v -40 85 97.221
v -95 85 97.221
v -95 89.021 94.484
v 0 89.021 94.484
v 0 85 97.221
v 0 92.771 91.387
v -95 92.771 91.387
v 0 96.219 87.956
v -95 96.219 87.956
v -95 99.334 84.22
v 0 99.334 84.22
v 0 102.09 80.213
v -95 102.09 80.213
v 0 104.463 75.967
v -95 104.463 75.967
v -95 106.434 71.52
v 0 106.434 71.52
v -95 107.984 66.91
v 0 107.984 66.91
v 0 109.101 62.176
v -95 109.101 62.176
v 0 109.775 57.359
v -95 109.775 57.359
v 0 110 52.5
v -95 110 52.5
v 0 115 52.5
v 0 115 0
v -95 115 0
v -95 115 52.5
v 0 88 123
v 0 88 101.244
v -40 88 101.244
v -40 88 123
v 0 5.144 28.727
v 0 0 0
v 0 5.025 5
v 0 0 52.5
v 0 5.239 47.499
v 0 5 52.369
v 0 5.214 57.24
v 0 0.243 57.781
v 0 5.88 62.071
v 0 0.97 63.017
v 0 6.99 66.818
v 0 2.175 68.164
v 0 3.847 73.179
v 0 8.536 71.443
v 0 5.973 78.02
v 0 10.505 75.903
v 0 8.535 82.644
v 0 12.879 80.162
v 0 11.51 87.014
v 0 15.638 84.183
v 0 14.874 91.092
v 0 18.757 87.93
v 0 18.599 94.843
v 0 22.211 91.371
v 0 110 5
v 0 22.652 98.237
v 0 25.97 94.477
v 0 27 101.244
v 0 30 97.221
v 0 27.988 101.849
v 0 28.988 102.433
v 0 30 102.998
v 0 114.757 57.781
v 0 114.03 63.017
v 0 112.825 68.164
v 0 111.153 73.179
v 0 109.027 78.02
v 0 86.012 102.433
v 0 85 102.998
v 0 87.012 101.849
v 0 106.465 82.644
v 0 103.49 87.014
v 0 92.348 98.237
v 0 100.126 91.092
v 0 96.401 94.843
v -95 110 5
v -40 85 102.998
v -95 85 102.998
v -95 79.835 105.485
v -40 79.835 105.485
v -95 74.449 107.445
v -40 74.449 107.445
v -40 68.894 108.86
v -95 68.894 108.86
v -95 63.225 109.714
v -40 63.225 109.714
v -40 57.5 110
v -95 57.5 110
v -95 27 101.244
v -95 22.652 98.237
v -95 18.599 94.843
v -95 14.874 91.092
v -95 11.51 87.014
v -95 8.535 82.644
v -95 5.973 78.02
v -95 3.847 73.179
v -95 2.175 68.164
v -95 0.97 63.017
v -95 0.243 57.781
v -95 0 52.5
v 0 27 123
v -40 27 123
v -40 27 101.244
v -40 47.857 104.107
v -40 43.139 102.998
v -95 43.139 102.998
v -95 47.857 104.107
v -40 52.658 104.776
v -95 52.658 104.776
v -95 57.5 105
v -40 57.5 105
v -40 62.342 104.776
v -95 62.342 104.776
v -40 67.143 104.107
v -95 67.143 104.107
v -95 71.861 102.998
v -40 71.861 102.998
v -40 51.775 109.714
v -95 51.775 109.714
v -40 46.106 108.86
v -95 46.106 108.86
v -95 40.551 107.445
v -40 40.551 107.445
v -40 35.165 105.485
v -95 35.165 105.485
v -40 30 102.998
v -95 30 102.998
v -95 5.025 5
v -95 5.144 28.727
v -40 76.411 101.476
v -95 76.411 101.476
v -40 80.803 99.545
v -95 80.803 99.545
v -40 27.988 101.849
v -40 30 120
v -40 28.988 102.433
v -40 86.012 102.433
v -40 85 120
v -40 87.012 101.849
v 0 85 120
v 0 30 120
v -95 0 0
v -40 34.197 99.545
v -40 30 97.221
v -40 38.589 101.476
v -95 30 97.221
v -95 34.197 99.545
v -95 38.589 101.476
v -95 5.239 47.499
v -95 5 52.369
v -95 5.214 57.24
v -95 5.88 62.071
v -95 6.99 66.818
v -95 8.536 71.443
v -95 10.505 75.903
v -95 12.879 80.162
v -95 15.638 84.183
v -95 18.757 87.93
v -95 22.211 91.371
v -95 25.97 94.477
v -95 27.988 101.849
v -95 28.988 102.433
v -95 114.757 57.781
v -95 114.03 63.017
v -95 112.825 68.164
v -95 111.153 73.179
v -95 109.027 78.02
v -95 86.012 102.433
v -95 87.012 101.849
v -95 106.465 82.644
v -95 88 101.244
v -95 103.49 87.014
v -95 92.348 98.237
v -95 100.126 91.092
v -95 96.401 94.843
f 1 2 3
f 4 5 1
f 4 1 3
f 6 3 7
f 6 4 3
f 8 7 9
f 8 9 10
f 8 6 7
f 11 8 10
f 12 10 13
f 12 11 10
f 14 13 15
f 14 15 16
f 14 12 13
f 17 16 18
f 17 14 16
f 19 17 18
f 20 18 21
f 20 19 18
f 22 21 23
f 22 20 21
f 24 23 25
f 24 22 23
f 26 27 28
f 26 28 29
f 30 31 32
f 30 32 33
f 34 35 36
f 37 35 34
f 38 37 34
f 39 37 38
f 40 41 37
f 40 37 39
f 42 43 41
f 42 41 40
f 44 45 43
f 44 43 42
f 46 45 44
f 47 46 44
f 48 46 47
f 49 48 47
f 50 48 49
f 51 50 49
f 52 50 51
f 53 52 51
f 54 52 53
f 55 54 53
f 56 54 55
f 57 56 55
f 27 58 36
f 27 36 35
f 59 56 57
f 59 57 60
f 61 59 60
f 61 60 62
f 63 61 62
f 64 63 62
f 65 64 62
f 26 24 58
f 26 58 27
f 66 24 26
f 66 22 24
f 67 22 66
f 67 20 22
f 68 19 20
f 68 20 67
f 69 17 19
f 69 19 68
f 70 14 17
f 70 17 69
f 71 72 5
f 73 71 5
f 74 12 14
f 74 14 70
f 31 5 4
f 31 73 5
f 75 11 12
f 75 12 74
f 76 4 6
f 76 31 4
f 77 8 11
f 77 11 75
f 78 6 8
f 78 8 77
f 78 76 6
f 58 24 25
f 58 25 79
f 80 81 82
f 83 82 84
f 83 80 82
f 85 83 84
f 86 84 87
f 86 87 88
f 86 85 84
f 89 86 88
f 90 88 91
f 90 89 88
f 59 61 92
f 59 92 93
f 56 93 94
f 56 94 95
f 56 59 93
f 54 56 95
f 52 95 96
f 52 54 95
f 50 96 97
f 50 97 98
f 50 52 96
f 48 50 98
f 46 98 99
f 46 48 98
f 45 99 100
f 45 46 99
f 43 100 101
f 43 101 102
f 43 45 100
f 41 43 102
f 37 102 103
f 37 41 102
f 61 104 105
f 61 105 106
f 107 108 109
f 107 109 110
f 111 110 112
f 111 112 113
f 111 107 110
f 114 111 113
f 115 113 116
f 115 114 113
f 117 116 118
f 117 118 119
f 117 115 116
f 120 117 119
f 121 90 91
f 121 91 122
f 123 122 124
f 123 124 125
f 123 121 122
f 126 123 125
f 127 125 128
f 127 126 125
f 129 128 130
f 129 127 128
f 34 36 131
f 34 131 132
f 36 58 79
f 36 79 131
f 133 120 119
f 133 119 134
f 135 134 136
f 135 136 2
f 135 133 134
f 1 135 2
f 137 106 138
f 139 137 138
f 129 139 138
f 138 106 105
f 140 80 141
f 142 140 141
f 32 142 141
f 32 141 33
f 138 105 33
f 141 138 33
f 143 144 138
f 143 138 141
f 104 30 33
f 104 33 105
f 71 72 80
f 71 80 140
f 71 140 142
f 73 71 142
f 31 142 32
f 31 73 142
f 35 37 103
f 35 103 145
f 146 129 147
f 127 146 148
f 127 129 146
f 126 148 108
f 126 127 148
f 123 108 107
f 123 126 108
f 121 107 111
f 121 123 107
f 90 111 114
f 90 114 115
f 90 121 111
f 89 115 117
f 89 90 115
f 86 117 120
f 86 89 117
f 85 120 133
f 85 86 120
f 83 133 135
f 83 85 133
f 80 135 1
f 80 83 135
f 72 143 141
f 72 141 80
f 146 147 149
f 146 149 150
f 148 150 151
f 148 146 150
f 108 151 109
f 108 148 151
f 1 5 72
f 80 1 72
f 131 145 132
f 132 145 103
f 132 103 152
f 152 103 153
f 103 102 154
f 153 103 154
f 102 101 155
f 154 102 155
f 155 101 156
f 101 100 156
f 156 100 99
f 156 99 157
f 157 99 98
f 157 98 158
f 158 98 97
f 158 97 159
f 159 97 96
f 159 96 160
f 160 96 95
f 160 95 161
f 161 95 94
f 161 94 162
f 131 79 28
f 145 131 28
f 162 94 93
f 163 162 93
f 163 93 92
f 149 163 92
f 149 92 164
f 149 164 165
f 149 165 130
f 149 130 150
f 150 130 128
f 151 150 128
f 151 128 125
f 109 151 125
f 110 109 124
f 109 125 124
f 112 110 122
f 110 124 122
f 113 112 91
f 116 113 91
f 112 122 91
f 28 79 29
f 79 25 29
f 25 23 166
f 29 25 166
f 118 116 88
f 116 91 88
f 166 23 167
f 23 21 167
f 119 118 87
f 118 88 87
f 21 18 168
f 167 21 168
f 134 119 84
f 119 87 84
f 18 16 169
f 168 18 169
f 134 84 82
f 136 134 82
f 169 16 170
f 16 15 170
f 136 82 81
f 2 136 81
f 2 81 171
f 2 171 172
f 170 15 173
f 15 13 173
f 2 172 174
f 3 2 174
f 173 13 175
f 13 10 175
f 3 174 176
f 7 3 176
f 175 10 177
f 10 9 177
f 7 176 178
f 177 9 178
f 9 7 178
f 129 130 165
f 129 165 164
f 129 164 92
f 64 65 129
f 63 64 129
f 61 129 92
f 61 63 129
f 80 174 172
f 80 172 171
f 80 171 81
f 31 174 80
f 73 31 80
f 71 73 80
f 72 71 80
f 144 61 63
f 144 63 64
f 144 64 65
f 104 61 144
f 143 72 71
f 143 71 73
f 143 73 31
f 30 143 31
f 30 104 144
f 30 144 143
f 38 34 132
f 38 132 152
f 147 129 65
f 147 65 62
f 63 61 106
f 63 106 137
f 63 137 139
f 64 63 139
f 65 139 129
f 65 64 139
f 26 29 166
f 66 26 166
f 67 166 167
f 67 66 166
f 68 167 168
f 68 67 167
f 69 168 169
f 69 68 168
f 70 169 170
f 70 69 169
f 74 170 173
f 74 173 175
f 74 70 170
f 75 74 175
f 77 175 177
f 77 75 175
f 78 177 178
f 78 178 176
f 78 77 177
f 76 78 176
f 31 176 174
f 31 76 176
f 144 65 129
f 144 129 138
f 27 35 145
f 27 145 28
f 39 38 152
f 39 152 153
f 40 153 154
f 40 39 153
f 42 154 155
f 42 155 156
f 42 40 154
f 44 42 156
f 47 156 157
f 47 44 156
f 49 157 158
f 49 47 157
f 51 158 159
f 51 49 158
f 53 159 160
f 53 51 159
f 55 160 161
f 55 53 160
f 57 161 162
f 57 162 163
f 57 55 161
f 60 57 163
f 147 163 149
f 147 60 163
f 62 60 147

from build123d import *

# Parameters (mm, degrees)
F0_W     = 5
F0_H     = 5
F1_DEPTH = 95
F2_DEPTH = 40
F3_DEPTH = 40


with BuildPart() as f1:
    # F0 (on Right) → F1 (new body)
    with BuildSketch(Plane.YZ):
        with BuildLine():
            ThreePointArc((25.096296508, 5), (29.4604368108, 2.3000707554), (34.0479212009, 0))
            Line((34.0479212009, 0), (57.5, 0))
            ThreePointArc((57.5, 0), (46.0435607626, 1.2652461702), (35.139320225, 5))
            Line((35.139320225, 5), (25.096296508, 5))
        make_face()
        with Locations((112.5, 2.5)):
            Rectangle(F0_W, F0_H)
        with BuildLine():
            Line((5.0251261048, 5), (5, 0))
            Line((5, 0), (34.0479212009, 0))
            ThreePointArc((34.0479212009, 0), (29.4604368108, 2.3000707554), (25.096296508, 5))
            Line((25.096296508, 5), (5.0251261048, 5))
        make_face()
        with BuildLine():
            ThreePointArc((79.860679775, 5), (68.9564392374, 1.2652461702), (57.5, 0))
            Line((57.5, 0), (80.9520787991, 0))
            ThreePointArc((80.9520787991, 0), (85.5395631892, 2.3000707554), (89.903703492, 5))
            Line((89.903703492, 5), (79.860679775, 5))
        make_face()
        with BuildLine():
            ThreePointArc((89.903703492, 5), (85.5395631892, 2.3000707554), (80.9520787991, 0))
            Line((80.9520787991, 0), (110, 0))
            Line((110, 0), (110, 5))
            Line((110, 5), (89.903703492, 5))
        make_face()
        with BuildLine():
            Line((110, 29.0479212009), (110, 5))
            Line((110, 5), (115, 5))
            Line((115, 5), (115, 52.5))
            ThreePointArc((115, 52.5), (113.736109396, 40.5104211917), (110, 29.0479212009))
        make_face()
        with BuildLine():
            Line((0, 52.5), (0, 5))
            Line((0, 5), (5.0251261048, 5))
            Line((5.0251261048, 5), (5.1443614689, 28.7273873123))
            ThreePointArc((5.1443614689, 28.7273873123), (1.3008042071, 40.3385694826), (0, 52.5))
        make_face()
        Polygon((0, 5), (0, 0), (5, 0), (5.0251261048, 5), align=None)
        with BuildLine():
            ThreePointArc((35.139320225, 5), (46.0435607626, 1.2652461702), (57.5, 0))
            ThreePointArc((57.5, 0), (68.9564392374, 1.2652461702), (79.860679775, 5))
            Line((79.860679775, 5), (35.139320225, 5))
        make_face()
        with BuildLine():
            ThreePointArc((27, 101.2442304278), (7.2008946402, 80.3612634315), (0, 52.5))
            ThreePointArc((0, 52.5), (1.3008042071, 40.3385694826), (5.1443614689, 28.7273873123))
            Line((5.1443614689, 28.7273873123), (5.2386949818, 47.4994002563))
            ThreePointArc((5.2386949818, 47.4994002563), (10.5049496909, 75.9033169967), (30, 97.22135955))
            Line((30, 97.22135955), (30, 102.9975246918))
            ThreePointArc((30, 102.9975246918), (28.4867528499, 102.1435442913), (27, 101.2442304278))
        make_face()
        with BuildLine():
            ThreePointArc((85, 97.22135955), (103.3257569496, 78.1173769149), (110, 52.5))
            Line((110, 52.5), (110, 29.0479212009))
            ThreePointArc((110, 29.0479212009), (113.736109396, 40.5104211917), (115, 52.5))
            ThreePointArc((115, 52.5), (107.7991053598, 80.3612634315), (88, 101.2442304278))
            ThreePointArc((88, 101.2442304278), (86.5132471501, 102.1435442913), (85, 102.9975246918))
            Line((85, 102.9975246918), (85, 97.22135955))
        make_face()
        with BuildLine():
            ThreePointArc((57.5, 110), (43.311231022, 108.2218882926), (30, 102.9975246918))
            Line((30, 102.9975246918), (43.1385933837, 102.9975246918))
            ThreePointArc((43.1385933837, 102.9975246918), (57.5, 105), (71.8614066163, 102.9975246918))
            Line((71.8614066163, 102.9975246918), (85, 102.9975246918))
            ThreePointArc((85, 102.9975246918), (71.688768978, 108.2218882926), (57.5, 110))
        make_face()
        with BuildLine():
            Line((43.1385933837, 102.9975246918), (30, 102.9975246918))
            Line((30, 102.9975246918), (30, 97.22135955))
            ThreePointArc((30, 97.22135955), (36.3709829403, 100.5605309801), (43.1385933837, 102.9975246918))
        make_face()
        with BuildLine():
            ThreePointArc((71.8614066163, 102.9975246918), (78.6290170597, 100.5605309801), (85, 97.22135955))
            Line((85, 97.22135955), (85, 102.9975246918))
            Line((85, 102.9975246918), (71.8614066163, 102.9975246918))
        make_face()
    extrude(amount=-F1_DEPTH)

    # F0 (on Right) → F3 (cut)
    with BuildSketch(Plane.YZ):
        with BuildLine():
            ThreePointArc((57.5, 110), (43.311231022, 108.2218882926), (30, 102.9975246918))
            Line((30, 102.9975246918), (43.1385933837, 102.9975246918))
            ThreePointArc((43.1385933837, 102.9975246918), (57.5, 105), (71.8614066163, 102.9975246918))
            Line((71.8614066163, 102.9975246918), (85, 102.9975246918))
            ThreePointArc((85, 102.9975246918), (71.688768978, 108.2218882926), (57.5, 110))
        make_face()
        with BuildLine():
            Line((43.1385933837, 102.9975246918), (30, 102.9975246918))
            Line((30, 102.9975246918), (30, 97.22135955))
            ThreePointArc((30, 97.22135955), (36.3709829403, 100.5605309801), (43.1385933837, 102.9975246918))
        make_face()
        with BuildLine():
            ThreePointArc((71.8614066163, 102.9975246918), (78.6290170597, 100.5605309801), (85, 97.22135955))
            Line((85, 97.22135955), (85, 102.9975246918))
            Line((85, 102.9975246918), (71.8614066163, 102.9975246918))
        make_face()
    extrude(amount=-F3_DEPTH, mode=Mode.SUBTRACT)


with BuildPart() as f2:
    # F0 (on Right) → F2 (new body)
    with BuildSketch(Plane.YZ):
        Polygon((27, 123), (27, 110), (30, 110), (30, 120), (85, 120), (85, 110), (88, 110), (88, 123), align=None)
        with BuildLine():
            Line((27, 110), (27, 101.2442304278))
            ThreePointArc((27, 101.2442304278), (28.4867528499, 102.1435442913), (30, 102.9975246918))
            Line((30, 102.9975246918), (30, 110))
            Line((30, 110), (27, 110))
        make_face()
        with BuildLine():
            Line((88, 110), (85, 110))
            Line((85, 110), (85, 102.9975246918))
            ThreePointArc((85, 102.9975246918), (86.5132471501, 102.1435442913), (88, 101.2442304278))
            Line((88, 101.2442304278), (88, 110))
        make_face()
    extrude(amount=-F2_DEPTH)


solid = Compound([f1.part, f2.part])
